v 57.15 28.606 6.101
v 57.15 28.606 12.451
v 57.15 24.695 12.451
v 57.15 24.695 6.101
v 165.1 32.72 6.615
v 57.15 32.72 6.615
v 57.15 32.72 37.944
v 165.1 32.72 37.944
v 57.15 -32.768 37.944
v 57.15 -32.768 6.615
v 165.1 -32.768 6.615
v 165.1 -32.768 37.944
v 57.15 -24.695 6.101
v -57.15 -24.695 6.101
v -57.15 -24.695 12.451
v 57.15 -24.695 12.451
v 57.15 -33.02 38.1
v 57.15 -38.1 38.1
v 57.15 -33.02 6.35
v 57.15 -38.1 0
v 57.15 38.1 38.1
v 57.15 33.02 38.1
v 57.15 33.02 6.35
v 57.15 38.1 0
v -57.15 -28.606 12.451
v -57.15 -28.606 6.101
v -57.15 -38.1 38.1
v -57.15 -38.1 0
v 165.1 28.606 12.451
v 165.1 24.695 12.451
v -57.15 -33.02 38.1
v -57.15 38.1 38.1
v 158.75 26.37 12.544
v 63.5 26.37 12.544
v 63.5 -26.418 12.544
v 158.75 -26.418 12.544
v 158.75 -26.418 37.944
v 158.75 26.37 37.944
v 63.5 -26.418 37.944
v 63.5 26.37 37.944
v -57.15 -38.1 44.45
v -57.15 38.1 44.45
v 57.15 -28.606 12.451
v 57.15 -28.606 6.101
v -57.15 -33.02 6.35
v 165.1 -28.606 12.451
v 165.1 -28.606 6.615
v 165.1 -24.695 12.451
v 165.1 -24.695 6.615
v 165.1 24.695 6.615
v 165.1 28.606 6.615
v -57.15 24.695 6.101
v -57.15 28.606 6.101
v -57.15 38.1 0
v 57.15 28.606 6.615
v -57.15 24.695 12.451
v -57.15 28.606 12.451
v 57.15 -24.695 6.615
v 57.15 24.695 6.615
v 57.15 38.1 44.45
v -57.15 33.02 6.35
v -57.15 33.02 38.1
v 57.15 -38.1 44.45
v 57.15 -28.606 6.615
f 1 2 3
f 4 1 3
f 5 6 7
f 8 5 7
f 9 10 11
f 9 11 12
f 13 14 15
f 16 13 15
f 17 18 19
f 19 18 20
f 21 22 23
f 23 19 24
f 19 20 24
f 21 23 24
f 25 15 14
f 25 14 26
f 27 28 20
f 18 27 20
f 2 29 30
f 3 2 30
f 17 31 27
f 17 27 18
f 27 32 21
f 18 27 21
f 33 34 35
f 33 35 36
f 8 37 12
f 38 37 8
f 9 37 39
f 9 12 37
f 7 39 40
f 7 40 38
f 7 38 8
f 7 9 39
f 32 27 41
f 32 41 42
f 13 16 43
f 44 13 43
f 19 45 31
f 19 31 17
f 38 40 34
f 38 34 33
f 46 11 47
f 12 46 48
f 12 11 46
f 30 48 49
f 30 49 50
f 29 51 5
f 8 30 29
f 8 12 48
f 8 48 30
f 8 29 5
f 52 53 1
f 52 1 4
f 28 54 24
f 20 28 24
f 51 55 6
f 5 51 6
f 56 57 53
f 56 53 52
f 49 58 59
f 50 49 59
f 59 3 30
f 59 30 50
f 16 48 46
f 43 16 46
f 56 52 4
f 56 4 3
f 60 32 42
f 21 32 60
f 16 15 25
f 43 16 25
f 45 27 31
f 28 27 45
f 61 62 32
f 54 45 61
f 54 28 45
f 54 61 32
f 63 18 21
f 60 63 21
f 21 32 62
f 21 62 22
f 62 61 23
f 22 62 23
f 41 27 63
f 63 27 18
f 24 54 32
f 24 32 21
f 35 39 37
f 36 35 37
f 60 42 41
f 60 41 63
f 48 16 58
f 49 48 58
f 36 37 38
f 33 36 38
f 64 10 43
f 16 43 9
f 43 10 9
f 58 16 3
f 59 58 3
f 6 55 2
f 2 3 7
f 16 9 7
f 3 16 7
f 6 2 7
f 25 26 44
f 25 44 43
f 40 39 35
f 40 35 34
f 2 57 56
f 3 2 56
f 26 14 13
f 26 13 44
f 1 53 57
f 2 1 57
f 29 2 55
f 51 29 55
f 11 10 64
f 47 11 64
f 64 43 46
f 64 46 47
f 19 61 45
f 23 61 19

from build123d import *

# Parameters (mm, degrees)
F0_W      = 114.3
F0_H      = 76.2
F1_DEPTH  = 6.35
F2_W      = 3.910894
F2_H      = 6.35
F3_DEPTH  = 114.3
F4_W      = 114.3
F4_H      = 5.08
F5_DEPTH  = 31.75
F6_W      = 65.488312
F6_H      = 31.328192
F7_DEPTH  = 107.95
F3_FACE_W = 3.910894
F3_FACE_H = 6.35
F8_DEPTH  = 139.7
F9_W      = 95.25
F9_H      = 52.788312
F11_DEPTH = 25.4
F10_W     = 114.3
F10_H     = 76.2
F12_DEPTH = 6.35


with BuildPart() as f1:
    # F0 (on Top) → F1 (new body)
    with BuildSketch(Plane.XY):
        Rectangle(F0_W, F0_H)
    extrude(amount=F1_DEPTH)

    # F4 (on face) → F5 (join)
    with BuildSketch(Plane.XY.offset(6.35)):
        with Locations((0, 35.56)):
            Rectangle(F4_W, F4_H)
        with Locations((0, -35.56)):
            Rectangle(F4_W, F4_H)
    extrude(amount=F5_DEPTH)


with BuildPart() as f3:
    # F2 (on face) → F3 (new body)
    with BuildSketch(Plane(origin=(-57.15, 0, 0), x_dir=(0, -1, 0), z_dir=(-1, 0, 0))):
        with Locations((-26.650668, 9.27593)):
            Rectangle(F2_W, F2_H)
        with Locations((26.650668, 9.27593)):
            Rectangle(F2_W, F2_H)
    extrude(amount=-F3_DEPTH)


with BuildPart() as f7:
    # F6 (on face) → F7 (new body)
    with BuildSketch(Plane.YZ.offset(57.15)):
        with Locations((-0.023877, 22.279591)):
            Rectangle(F6_W, F6_H)
    extrude(amount=F7_DEPTH)

    # F3_face (on face) → F8 (cut)
    with BuildSketch(Plane(origin=(57.15, -26.650668, 9.27593), x_dir=(0, -1, 0), z_dir=(1, 0, 0))):
        Rectangle(F3_FACE_W, F3_FACE_H)
        with Locations((-53.301336, 0)):
            Rectangle(F3_FACE_W, F3_FACE_H)
    extrude(amount=F8_DEPTH, mode=Mode.SUBTRACT)

    # F9 (on face) → F11 (cut)
    with BuildSketch(Plane.XY.offset(37.943687)):
        with Locations((111.125, -0.023877)):
            Rectangle(F9_W, F9_H)
    extrude(amount=-F11_DEPTH, mode=Mode.SUBTRACT)


with BuildPart() as f12:
    # F10 (on face) → F12 (new body)
    with BuildSketch(Plane.XY.offset(38.1)):
        Rectangle(F10_W, F10_H)
    extrude(amount=F12_DEPTH)


solid = Compound([f1.part, f3.part, f7.part, f12.part])
